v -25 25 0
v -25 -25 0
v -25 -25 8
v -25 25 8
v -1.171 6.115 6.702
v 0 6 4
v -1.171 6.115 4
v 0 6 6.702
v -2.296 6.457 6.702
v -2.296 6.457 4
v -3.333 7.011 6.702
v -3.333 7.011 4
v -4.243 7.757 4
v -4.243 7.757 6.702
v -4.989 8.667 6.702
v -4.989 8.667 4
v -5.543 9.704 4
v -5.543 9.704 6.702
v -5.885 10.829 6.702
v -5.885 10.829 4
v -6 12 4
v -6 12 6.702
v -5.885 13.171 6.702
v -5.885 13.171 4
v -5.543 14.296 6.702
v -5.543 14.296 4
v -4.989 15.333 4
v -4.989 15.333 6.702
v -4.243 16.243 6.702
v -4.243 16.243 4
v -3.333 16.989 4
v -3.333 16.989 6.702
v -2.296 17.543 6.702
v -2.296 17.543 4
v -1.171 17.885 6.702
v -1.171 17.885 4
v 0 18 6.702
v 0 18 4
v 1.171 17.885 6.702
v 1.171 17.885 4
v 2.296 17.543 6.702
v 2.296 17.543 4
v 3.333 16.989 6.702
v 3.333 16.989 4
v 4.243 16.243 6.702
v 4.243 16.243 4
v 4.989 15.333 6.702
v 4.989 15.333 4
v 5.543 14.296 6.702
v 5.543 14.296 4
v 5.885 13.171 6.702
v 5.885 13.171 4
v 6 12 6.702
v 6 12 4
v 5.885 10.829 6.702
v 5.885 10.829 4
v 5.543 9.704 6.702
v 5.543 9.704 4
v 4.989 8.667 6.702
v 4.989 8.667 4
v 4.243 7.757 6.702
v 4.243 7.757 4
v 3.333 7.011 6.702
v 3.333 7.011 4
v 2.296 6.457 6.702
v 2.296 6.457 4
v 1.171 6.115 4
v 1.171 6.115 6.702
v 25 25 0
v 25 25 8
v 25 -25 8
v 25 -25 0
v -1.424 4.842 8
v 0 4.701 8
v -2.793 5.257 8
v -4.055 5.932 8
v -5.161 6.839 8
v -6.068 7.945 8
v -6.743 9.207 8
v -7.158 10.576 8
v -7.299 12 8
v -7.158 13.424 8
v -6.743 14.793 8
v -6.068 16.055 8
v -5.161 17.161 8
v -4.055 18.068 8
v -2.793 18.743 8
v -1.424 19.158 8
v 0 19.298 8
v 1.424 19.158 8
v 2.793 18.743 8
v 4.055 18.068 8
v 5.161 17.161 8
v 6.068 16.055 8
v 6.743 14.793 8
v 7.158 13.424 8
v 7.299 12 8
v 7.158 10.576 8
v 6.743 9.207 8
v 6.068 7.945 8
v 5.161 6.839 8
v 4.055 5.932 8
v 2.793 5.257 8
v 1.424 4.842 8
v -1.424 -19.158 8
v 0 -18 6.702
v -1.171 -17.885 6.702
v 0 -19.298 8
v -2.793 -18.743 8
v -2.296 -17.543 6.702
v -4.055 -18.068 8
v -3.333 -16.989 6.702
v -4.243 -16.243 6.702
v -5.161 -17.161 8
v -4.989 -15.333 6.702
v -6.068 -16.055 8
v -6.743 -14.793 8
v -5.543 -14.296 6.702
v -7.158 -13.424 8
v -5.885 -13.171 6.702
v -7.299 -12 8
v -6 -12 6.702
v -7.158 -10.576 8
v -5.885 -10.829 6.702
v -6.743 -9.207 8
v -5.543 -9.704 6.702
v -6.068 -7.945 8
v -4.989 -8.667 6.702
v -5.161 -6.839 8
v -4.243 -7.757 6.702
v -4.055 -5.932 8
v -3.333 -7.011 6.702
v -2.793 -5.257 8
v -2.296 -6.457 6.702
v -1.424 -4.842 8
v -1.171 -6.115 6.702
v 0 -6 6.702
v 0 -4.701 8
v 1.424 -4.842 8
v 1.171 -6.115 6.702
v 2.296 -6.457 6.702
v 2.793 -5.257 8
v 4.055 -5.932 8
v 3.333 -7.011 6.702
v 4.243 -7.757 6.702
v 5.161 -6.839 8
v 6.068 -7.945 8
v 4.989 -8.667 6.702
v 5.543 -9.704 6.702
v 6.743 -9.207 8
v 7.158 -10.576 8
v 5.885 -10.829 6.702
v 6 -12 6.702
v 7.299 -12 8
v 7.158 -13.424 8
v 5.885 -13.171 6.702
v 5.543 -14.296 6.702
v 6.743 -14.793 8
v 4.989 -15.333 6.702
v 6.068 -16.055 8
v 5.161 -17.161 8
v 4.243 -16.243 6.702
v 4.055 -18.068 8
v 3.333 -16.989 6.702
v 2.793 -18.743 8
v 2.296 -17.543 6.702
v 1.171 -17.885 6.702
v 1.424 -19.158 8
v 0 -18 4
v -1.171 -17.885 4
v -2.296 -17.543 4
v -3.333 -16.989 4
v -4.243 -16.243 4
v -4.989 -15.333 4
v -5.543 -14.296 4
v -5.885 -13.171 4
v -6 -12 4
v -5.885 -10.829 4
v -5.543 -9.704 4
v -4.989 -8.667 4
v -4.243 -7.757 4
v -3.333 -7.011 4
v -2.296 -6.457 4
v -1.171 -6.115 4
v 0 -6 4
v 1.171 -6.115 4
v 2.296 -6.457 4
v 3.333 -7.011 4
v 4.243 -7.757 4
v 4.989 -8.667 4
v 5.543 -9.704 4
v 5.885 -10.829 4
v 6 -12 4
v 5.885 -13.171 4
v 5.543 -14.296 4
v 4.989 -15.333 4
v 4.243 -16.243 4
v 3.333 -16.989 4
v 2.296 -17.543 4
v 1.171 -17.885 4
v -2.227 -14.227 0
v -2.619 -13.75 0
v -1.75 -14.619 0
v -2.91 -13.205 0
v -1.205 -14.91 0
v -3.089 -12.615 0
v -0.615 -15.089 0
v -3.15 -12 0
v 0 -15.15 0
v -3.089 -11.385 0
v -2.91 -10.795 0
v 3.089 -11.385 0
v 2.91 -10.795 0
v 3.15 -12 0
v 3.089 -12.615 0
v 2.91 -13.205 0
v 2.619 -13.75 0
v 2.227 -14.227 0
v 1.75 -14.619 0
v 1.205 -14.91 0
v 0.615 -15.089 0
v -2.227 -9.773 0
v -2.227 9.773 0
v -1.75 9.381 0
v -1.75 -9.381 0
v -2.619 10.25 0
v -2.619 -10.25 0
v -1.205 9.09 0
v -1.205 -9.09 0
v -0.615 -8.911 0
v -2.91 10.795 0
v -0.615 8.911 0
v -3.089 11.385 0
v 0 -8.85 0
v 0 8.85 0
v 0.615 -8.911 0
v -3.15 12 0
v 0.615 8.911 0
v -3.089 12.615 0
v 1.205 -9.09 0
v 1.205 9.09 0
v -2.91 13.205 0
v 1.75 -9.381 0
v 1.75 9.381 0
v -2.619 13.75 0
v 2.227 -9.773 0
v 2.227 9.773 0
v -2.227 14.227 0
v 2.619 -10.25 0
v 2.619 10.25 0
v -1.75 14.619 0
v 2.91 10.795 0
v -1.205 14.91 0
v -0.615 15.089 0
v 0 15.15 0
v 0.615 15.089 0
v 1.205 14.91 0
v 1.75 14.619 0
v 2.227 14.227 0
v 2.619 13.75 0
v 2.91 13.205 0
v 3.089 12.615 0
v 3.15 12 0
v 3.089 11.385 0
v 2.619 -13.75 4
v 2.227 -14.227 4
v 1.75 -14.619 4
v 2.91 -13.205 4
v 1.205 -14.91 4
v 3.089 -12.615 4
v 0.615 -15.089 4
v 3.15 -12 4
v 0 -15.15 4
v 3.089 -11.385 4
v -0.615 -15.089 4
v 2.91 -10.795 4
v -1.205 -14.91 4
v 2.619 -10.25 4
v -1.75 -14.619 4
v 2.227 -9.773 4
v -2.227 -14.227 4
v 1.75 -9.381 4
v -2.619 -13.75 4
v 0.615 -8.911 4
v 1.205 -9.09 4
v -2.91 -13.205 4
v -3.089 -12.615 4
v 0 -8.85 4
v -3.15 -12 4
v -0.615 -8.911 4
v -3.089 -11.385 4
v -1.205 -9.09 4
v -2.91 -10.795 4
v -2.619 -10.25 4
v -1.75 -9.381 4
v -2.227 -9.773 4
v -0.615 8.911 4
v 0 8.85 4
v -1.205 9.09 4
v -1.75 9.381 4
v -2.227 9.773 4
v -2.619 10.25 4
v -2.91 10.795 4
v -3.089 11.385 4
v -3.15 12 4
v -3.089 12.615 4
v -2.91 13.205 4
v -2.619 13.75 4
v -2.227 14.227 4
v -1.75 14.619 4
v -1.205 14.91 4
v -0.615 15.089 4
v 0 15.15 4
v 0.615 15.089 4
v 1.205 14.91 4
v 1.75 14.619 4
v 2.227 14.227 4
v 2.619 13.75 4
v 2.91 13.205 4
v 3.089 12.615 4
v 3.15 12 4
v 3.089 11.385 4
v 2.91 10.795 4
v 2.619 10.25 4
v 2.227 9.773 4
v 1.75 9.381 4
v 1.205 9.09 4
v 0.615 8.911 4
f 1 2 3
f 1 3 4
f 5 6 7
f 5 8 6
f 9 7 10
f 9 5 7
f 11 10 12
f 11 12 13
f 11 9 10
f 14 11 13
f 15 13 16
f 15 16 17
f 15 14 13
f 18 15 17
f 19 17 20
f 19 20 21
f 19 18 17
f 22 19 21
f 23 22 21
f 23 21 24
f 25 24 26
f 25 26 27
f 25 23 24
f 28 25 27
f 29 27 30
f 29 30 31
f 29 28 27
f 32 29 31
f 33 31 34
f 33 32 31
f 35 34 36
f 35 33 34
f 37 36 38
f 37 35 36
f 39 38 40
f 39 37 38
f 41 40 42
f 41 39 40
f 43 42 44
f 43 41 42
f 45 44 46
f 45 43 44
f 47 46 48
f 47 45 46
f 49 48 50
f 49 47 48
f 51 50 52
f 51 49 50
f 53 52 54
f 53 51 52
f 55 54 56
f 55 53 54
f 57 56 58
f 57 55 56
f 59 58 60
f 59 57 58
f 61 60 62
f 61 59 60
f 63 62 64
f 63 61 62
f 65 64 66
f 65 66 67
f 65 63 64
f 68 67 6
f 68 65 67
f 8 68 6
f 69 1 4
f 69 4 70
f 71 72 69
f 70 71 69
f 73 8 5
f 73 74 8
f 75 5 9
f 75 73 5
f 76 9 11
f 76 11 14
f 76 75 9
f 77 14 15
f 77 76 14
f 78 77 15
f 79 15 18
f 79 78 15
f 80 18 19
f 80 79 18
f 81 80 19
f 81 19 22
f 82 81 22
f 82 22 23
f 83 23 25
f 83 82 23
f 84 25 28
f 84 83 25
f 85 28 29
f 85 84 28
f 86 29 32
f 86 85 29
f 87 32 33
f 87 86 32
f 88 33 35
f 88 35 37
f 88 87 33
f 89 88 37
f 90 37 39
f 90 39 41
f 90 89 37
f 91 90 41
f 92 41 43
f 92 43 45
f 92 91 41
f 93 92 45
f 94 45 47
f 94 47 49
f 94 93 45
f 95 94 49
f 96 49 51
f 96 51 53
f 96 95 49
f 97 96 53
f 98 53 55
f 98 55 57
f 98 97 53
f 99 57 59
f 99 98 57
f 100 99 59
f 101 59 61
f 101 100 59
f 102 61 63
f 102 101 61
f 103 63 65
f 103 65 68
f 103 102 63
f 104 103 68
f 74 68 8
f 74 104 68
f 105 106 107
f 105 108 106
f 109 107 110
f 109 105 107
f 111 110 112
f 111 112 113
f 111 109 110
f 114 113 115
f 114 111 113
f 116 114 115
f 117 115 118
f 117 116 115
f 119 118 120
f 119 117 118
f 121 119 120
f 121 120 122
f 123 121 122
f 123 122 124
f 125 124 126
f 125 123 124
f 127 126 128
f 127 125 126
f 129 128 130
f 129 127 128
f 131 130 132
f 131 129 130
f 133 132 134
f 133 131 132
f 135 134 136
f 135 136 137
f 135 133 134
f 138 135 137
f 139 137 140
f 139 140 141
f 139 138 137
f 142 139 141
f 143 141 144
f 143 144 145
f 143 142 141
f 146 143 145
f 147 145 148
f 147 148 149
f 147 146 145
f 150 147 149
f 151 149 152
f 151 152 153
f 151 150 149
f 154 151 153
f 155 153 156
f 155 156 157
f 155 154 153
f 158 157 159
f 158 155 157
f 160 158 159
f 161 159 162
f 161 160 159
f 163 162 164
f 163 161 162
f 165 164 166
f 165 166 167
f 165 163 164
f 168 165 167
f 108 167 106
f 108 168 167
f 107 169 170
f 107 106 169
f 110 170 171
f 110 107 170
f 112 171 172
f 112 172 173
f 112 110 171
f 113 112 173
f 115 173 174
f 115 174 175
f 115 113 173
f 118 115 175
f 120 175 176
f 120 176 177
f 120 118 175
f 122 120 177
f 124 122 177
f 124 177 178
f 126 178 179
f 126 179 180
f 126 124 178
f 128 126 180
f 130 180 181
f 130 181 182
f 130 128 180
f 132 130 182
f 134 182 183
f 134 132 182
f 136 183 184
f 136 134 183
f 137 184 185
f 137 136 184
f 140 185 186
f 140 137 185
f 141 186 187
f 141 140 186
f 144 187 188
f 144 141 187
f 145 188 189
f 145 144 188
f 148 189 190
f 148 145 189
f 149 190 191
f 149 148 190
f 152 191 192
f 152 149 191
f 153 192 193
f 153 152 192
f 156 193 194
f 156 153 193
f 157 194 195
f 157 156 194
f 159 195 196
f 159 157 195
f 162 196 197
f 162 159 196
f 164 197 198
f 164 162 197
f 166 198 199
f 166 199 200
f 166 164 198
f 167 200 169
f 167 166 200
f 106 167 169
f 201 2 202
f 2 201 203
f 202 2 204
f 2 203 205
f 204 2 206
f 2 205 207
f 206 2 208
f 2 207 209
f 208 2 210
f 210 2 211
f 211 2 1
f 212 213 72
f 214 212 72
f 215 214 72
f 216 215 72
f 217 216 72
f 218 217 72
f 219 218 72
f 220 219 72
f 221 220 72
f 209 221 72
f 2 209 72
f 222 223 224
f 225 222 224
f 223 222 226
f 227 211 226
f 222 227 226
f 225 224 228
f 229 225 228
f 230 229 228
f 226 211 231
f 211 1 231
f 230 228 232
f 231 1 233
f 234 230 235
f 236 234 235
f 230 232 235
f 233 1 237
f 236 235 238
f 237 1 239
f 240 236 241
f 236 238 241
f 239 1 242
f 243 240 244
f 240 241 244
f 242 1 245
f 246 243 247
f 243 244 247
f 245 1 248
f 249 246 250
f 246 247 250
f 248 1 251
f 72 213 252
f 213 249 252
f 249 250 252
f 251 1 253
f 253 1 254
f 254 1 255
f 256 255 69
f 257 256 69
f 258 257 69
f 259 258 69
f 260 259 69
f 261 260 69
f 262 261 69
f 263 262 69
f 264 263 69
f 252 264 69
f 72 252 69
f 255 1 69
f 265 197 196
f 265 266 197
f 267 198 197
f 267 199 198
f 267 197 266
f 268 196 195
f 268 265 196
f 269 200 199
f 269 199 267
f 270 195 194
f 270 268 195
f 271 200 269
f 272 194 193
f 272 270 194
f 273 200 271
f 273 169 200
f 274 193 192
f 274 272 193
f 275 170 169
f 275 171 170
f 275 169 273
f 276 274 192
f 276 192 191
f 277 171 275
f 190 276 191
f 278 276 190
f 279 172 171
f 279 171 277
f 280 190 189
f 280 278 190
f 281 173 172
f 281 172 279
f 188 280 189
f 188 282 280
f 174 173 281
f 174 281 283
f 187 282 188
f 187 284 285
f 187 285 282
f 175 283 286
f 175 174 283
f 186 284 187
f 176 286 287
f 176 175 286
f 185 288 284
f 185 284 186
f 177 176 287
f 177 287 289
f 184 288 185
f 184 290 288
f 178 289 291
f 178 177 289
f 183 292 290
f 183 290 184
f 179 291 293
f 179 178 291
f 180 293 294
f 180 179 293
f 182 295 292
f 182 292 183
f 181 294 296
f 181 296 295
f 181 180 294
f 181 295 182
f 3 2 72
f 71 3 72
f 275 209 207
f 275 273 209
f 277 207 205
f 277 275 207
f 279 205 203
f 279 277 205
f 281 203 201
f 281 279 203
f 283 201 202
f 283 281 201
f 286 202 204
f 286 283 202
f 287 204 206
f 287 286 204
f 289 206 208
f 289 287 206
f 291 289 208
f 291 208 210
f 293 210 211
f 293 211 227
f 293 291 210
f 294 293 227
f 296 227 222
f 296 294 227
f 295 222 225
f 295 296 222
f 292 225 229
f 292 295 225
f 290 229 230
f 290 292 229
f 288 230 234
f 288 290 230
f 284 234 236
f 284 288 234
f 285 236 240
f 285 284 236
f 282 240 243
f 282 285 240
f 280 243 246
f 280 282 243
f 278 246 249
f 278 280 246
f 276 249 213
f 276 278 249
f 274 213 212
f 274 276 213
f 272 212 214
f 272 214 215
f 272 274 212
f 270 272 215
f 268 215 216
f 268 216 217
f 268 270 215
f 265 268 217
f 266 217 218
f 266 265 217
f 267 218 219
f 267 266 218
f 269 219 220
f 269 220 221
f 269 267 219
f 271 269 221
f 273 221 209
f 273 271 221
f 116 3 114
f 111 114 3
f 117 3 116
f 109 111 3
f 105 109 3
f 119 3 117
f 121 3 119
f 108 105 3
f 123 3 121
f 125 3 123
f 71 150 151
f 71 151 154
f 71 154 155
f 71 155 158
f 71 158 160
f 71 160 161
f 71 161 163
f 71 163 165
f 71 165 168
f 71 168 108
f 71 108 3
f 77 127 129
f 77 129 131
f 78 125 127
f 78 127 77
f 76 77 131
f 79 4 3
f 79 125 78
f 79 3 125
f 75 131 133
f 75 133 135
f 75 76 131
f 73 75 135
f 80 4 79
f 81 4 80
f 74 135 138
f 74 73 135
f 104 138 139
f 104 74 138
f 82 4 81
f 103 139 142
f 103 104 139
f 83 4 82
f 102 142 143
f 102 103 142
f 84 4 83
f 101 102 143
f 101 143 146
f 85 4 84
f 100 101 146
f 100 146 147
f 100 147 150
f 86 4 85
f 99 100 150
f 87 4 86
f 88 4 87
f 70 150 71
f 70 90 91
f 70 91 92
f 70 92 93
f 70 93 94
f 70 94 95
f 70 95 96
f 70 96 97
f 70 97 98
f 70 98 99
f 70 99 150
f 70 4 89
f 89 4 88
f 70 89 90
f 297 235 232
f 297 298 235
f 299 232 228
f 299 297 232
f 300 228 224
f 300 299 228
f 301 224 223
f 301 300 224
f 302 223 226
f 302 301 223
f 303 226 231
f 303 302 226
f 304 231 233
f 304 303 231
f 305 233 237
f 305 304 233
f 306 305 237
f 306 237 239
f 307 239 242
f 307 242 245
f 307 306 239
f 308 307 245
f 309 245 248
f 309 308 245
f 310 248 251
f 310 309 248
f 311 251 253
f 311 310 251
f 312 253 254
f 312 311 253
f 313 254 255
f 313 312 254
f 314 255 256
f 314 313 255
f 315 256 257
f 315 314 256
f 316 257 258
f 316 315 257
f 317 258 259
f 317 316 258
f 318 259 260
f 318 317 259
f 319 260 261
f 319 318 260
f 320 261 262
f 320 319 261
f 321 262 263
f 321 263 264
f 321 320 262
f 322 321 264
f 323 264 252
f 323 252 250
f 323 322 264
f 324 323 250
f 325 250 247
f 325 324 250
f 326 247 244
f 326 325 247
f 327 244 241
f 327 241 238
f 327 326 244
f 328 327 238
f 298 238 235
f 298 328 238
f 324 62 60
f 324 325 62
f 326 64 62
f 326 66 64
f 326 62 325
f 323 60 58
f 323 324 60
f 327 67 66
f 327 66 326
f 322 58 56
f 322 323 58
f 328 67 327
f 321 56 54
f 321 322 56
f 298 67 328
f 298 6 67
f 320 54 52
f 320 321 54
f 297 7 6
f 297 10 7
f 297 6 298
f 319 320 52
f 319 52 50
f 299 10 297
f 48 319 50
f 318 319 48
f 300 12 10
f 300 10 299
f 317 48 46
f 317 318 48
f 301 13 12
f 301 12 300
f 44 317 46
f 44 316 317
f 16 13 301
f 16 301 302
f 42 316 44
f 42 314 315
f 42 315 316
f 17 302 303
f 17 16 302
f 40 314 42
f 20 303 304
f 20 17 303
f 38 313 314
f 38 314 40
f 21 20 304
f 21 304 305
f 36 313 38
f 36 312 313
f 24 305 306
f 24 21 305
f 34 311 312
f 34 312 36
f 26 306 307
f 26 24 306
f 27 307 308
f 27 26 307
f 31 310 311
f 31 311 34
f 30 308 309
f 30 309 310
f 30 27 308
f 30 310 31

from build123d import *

# Parameters (mm, degrees)
SKETCH1_W                              = 50
SKETCH1_H                              = 50
BOSS_EXTRUDE1_DEPTH                    = 8
CBORE_FOR_M6_HEX_HEAD_BOLT2_AT_2_COUNT = 2
CBORE_FOR_M6_HEX_HEAD_BOLT2_AT_2_PITCH = 24


with BuildPart() as part:
    # Sketch1 → Boss-Extrude1 (new body)
    with BuildSketch(Plane.XY):
        Rectangle(SKETCH1_W, SKETCH1_H)
    extrude(amount=BOSS_EXTRUDE1_DEPTH)

    # Sketch14 → CBORE for M6 Hex Head Bolt2 (revolve, cut)
    with BuildSketch(Plane(origin=(0, -12, 8), x_dir=(0, -1, 0), z_dir=(1, 0, 0))):
        Polygon((0, 0), (0, 8), (3.15, 8), (3.15, 4), (6, 4), (6, 1.2985), (7.2985, 0), align=None)
    cbore_for_m6_hex_head_bolt2 = revolve(axis=Axis((0, -12, 14.35), (0, 0, -1)), mode=Mode.SUBTRACT)

    # CBORE for M6 Hex Head Bolt2 at 2: CBORE for M6 Hex Head Bolt2 ×2
    with Locations(*[(0, i * CBORE_FOR_M6_HEX_HEAD_BOLT2_AT_2_PITCH, 0) for i in range(1, CBORE_FOR_M6_HEX_HEAD_BOLT2_AT_2_COUNT)]):
        add(cbore_for_m6_hex_head_bolt2, mode=Mode.SUBTRACT)


solid = part.part
